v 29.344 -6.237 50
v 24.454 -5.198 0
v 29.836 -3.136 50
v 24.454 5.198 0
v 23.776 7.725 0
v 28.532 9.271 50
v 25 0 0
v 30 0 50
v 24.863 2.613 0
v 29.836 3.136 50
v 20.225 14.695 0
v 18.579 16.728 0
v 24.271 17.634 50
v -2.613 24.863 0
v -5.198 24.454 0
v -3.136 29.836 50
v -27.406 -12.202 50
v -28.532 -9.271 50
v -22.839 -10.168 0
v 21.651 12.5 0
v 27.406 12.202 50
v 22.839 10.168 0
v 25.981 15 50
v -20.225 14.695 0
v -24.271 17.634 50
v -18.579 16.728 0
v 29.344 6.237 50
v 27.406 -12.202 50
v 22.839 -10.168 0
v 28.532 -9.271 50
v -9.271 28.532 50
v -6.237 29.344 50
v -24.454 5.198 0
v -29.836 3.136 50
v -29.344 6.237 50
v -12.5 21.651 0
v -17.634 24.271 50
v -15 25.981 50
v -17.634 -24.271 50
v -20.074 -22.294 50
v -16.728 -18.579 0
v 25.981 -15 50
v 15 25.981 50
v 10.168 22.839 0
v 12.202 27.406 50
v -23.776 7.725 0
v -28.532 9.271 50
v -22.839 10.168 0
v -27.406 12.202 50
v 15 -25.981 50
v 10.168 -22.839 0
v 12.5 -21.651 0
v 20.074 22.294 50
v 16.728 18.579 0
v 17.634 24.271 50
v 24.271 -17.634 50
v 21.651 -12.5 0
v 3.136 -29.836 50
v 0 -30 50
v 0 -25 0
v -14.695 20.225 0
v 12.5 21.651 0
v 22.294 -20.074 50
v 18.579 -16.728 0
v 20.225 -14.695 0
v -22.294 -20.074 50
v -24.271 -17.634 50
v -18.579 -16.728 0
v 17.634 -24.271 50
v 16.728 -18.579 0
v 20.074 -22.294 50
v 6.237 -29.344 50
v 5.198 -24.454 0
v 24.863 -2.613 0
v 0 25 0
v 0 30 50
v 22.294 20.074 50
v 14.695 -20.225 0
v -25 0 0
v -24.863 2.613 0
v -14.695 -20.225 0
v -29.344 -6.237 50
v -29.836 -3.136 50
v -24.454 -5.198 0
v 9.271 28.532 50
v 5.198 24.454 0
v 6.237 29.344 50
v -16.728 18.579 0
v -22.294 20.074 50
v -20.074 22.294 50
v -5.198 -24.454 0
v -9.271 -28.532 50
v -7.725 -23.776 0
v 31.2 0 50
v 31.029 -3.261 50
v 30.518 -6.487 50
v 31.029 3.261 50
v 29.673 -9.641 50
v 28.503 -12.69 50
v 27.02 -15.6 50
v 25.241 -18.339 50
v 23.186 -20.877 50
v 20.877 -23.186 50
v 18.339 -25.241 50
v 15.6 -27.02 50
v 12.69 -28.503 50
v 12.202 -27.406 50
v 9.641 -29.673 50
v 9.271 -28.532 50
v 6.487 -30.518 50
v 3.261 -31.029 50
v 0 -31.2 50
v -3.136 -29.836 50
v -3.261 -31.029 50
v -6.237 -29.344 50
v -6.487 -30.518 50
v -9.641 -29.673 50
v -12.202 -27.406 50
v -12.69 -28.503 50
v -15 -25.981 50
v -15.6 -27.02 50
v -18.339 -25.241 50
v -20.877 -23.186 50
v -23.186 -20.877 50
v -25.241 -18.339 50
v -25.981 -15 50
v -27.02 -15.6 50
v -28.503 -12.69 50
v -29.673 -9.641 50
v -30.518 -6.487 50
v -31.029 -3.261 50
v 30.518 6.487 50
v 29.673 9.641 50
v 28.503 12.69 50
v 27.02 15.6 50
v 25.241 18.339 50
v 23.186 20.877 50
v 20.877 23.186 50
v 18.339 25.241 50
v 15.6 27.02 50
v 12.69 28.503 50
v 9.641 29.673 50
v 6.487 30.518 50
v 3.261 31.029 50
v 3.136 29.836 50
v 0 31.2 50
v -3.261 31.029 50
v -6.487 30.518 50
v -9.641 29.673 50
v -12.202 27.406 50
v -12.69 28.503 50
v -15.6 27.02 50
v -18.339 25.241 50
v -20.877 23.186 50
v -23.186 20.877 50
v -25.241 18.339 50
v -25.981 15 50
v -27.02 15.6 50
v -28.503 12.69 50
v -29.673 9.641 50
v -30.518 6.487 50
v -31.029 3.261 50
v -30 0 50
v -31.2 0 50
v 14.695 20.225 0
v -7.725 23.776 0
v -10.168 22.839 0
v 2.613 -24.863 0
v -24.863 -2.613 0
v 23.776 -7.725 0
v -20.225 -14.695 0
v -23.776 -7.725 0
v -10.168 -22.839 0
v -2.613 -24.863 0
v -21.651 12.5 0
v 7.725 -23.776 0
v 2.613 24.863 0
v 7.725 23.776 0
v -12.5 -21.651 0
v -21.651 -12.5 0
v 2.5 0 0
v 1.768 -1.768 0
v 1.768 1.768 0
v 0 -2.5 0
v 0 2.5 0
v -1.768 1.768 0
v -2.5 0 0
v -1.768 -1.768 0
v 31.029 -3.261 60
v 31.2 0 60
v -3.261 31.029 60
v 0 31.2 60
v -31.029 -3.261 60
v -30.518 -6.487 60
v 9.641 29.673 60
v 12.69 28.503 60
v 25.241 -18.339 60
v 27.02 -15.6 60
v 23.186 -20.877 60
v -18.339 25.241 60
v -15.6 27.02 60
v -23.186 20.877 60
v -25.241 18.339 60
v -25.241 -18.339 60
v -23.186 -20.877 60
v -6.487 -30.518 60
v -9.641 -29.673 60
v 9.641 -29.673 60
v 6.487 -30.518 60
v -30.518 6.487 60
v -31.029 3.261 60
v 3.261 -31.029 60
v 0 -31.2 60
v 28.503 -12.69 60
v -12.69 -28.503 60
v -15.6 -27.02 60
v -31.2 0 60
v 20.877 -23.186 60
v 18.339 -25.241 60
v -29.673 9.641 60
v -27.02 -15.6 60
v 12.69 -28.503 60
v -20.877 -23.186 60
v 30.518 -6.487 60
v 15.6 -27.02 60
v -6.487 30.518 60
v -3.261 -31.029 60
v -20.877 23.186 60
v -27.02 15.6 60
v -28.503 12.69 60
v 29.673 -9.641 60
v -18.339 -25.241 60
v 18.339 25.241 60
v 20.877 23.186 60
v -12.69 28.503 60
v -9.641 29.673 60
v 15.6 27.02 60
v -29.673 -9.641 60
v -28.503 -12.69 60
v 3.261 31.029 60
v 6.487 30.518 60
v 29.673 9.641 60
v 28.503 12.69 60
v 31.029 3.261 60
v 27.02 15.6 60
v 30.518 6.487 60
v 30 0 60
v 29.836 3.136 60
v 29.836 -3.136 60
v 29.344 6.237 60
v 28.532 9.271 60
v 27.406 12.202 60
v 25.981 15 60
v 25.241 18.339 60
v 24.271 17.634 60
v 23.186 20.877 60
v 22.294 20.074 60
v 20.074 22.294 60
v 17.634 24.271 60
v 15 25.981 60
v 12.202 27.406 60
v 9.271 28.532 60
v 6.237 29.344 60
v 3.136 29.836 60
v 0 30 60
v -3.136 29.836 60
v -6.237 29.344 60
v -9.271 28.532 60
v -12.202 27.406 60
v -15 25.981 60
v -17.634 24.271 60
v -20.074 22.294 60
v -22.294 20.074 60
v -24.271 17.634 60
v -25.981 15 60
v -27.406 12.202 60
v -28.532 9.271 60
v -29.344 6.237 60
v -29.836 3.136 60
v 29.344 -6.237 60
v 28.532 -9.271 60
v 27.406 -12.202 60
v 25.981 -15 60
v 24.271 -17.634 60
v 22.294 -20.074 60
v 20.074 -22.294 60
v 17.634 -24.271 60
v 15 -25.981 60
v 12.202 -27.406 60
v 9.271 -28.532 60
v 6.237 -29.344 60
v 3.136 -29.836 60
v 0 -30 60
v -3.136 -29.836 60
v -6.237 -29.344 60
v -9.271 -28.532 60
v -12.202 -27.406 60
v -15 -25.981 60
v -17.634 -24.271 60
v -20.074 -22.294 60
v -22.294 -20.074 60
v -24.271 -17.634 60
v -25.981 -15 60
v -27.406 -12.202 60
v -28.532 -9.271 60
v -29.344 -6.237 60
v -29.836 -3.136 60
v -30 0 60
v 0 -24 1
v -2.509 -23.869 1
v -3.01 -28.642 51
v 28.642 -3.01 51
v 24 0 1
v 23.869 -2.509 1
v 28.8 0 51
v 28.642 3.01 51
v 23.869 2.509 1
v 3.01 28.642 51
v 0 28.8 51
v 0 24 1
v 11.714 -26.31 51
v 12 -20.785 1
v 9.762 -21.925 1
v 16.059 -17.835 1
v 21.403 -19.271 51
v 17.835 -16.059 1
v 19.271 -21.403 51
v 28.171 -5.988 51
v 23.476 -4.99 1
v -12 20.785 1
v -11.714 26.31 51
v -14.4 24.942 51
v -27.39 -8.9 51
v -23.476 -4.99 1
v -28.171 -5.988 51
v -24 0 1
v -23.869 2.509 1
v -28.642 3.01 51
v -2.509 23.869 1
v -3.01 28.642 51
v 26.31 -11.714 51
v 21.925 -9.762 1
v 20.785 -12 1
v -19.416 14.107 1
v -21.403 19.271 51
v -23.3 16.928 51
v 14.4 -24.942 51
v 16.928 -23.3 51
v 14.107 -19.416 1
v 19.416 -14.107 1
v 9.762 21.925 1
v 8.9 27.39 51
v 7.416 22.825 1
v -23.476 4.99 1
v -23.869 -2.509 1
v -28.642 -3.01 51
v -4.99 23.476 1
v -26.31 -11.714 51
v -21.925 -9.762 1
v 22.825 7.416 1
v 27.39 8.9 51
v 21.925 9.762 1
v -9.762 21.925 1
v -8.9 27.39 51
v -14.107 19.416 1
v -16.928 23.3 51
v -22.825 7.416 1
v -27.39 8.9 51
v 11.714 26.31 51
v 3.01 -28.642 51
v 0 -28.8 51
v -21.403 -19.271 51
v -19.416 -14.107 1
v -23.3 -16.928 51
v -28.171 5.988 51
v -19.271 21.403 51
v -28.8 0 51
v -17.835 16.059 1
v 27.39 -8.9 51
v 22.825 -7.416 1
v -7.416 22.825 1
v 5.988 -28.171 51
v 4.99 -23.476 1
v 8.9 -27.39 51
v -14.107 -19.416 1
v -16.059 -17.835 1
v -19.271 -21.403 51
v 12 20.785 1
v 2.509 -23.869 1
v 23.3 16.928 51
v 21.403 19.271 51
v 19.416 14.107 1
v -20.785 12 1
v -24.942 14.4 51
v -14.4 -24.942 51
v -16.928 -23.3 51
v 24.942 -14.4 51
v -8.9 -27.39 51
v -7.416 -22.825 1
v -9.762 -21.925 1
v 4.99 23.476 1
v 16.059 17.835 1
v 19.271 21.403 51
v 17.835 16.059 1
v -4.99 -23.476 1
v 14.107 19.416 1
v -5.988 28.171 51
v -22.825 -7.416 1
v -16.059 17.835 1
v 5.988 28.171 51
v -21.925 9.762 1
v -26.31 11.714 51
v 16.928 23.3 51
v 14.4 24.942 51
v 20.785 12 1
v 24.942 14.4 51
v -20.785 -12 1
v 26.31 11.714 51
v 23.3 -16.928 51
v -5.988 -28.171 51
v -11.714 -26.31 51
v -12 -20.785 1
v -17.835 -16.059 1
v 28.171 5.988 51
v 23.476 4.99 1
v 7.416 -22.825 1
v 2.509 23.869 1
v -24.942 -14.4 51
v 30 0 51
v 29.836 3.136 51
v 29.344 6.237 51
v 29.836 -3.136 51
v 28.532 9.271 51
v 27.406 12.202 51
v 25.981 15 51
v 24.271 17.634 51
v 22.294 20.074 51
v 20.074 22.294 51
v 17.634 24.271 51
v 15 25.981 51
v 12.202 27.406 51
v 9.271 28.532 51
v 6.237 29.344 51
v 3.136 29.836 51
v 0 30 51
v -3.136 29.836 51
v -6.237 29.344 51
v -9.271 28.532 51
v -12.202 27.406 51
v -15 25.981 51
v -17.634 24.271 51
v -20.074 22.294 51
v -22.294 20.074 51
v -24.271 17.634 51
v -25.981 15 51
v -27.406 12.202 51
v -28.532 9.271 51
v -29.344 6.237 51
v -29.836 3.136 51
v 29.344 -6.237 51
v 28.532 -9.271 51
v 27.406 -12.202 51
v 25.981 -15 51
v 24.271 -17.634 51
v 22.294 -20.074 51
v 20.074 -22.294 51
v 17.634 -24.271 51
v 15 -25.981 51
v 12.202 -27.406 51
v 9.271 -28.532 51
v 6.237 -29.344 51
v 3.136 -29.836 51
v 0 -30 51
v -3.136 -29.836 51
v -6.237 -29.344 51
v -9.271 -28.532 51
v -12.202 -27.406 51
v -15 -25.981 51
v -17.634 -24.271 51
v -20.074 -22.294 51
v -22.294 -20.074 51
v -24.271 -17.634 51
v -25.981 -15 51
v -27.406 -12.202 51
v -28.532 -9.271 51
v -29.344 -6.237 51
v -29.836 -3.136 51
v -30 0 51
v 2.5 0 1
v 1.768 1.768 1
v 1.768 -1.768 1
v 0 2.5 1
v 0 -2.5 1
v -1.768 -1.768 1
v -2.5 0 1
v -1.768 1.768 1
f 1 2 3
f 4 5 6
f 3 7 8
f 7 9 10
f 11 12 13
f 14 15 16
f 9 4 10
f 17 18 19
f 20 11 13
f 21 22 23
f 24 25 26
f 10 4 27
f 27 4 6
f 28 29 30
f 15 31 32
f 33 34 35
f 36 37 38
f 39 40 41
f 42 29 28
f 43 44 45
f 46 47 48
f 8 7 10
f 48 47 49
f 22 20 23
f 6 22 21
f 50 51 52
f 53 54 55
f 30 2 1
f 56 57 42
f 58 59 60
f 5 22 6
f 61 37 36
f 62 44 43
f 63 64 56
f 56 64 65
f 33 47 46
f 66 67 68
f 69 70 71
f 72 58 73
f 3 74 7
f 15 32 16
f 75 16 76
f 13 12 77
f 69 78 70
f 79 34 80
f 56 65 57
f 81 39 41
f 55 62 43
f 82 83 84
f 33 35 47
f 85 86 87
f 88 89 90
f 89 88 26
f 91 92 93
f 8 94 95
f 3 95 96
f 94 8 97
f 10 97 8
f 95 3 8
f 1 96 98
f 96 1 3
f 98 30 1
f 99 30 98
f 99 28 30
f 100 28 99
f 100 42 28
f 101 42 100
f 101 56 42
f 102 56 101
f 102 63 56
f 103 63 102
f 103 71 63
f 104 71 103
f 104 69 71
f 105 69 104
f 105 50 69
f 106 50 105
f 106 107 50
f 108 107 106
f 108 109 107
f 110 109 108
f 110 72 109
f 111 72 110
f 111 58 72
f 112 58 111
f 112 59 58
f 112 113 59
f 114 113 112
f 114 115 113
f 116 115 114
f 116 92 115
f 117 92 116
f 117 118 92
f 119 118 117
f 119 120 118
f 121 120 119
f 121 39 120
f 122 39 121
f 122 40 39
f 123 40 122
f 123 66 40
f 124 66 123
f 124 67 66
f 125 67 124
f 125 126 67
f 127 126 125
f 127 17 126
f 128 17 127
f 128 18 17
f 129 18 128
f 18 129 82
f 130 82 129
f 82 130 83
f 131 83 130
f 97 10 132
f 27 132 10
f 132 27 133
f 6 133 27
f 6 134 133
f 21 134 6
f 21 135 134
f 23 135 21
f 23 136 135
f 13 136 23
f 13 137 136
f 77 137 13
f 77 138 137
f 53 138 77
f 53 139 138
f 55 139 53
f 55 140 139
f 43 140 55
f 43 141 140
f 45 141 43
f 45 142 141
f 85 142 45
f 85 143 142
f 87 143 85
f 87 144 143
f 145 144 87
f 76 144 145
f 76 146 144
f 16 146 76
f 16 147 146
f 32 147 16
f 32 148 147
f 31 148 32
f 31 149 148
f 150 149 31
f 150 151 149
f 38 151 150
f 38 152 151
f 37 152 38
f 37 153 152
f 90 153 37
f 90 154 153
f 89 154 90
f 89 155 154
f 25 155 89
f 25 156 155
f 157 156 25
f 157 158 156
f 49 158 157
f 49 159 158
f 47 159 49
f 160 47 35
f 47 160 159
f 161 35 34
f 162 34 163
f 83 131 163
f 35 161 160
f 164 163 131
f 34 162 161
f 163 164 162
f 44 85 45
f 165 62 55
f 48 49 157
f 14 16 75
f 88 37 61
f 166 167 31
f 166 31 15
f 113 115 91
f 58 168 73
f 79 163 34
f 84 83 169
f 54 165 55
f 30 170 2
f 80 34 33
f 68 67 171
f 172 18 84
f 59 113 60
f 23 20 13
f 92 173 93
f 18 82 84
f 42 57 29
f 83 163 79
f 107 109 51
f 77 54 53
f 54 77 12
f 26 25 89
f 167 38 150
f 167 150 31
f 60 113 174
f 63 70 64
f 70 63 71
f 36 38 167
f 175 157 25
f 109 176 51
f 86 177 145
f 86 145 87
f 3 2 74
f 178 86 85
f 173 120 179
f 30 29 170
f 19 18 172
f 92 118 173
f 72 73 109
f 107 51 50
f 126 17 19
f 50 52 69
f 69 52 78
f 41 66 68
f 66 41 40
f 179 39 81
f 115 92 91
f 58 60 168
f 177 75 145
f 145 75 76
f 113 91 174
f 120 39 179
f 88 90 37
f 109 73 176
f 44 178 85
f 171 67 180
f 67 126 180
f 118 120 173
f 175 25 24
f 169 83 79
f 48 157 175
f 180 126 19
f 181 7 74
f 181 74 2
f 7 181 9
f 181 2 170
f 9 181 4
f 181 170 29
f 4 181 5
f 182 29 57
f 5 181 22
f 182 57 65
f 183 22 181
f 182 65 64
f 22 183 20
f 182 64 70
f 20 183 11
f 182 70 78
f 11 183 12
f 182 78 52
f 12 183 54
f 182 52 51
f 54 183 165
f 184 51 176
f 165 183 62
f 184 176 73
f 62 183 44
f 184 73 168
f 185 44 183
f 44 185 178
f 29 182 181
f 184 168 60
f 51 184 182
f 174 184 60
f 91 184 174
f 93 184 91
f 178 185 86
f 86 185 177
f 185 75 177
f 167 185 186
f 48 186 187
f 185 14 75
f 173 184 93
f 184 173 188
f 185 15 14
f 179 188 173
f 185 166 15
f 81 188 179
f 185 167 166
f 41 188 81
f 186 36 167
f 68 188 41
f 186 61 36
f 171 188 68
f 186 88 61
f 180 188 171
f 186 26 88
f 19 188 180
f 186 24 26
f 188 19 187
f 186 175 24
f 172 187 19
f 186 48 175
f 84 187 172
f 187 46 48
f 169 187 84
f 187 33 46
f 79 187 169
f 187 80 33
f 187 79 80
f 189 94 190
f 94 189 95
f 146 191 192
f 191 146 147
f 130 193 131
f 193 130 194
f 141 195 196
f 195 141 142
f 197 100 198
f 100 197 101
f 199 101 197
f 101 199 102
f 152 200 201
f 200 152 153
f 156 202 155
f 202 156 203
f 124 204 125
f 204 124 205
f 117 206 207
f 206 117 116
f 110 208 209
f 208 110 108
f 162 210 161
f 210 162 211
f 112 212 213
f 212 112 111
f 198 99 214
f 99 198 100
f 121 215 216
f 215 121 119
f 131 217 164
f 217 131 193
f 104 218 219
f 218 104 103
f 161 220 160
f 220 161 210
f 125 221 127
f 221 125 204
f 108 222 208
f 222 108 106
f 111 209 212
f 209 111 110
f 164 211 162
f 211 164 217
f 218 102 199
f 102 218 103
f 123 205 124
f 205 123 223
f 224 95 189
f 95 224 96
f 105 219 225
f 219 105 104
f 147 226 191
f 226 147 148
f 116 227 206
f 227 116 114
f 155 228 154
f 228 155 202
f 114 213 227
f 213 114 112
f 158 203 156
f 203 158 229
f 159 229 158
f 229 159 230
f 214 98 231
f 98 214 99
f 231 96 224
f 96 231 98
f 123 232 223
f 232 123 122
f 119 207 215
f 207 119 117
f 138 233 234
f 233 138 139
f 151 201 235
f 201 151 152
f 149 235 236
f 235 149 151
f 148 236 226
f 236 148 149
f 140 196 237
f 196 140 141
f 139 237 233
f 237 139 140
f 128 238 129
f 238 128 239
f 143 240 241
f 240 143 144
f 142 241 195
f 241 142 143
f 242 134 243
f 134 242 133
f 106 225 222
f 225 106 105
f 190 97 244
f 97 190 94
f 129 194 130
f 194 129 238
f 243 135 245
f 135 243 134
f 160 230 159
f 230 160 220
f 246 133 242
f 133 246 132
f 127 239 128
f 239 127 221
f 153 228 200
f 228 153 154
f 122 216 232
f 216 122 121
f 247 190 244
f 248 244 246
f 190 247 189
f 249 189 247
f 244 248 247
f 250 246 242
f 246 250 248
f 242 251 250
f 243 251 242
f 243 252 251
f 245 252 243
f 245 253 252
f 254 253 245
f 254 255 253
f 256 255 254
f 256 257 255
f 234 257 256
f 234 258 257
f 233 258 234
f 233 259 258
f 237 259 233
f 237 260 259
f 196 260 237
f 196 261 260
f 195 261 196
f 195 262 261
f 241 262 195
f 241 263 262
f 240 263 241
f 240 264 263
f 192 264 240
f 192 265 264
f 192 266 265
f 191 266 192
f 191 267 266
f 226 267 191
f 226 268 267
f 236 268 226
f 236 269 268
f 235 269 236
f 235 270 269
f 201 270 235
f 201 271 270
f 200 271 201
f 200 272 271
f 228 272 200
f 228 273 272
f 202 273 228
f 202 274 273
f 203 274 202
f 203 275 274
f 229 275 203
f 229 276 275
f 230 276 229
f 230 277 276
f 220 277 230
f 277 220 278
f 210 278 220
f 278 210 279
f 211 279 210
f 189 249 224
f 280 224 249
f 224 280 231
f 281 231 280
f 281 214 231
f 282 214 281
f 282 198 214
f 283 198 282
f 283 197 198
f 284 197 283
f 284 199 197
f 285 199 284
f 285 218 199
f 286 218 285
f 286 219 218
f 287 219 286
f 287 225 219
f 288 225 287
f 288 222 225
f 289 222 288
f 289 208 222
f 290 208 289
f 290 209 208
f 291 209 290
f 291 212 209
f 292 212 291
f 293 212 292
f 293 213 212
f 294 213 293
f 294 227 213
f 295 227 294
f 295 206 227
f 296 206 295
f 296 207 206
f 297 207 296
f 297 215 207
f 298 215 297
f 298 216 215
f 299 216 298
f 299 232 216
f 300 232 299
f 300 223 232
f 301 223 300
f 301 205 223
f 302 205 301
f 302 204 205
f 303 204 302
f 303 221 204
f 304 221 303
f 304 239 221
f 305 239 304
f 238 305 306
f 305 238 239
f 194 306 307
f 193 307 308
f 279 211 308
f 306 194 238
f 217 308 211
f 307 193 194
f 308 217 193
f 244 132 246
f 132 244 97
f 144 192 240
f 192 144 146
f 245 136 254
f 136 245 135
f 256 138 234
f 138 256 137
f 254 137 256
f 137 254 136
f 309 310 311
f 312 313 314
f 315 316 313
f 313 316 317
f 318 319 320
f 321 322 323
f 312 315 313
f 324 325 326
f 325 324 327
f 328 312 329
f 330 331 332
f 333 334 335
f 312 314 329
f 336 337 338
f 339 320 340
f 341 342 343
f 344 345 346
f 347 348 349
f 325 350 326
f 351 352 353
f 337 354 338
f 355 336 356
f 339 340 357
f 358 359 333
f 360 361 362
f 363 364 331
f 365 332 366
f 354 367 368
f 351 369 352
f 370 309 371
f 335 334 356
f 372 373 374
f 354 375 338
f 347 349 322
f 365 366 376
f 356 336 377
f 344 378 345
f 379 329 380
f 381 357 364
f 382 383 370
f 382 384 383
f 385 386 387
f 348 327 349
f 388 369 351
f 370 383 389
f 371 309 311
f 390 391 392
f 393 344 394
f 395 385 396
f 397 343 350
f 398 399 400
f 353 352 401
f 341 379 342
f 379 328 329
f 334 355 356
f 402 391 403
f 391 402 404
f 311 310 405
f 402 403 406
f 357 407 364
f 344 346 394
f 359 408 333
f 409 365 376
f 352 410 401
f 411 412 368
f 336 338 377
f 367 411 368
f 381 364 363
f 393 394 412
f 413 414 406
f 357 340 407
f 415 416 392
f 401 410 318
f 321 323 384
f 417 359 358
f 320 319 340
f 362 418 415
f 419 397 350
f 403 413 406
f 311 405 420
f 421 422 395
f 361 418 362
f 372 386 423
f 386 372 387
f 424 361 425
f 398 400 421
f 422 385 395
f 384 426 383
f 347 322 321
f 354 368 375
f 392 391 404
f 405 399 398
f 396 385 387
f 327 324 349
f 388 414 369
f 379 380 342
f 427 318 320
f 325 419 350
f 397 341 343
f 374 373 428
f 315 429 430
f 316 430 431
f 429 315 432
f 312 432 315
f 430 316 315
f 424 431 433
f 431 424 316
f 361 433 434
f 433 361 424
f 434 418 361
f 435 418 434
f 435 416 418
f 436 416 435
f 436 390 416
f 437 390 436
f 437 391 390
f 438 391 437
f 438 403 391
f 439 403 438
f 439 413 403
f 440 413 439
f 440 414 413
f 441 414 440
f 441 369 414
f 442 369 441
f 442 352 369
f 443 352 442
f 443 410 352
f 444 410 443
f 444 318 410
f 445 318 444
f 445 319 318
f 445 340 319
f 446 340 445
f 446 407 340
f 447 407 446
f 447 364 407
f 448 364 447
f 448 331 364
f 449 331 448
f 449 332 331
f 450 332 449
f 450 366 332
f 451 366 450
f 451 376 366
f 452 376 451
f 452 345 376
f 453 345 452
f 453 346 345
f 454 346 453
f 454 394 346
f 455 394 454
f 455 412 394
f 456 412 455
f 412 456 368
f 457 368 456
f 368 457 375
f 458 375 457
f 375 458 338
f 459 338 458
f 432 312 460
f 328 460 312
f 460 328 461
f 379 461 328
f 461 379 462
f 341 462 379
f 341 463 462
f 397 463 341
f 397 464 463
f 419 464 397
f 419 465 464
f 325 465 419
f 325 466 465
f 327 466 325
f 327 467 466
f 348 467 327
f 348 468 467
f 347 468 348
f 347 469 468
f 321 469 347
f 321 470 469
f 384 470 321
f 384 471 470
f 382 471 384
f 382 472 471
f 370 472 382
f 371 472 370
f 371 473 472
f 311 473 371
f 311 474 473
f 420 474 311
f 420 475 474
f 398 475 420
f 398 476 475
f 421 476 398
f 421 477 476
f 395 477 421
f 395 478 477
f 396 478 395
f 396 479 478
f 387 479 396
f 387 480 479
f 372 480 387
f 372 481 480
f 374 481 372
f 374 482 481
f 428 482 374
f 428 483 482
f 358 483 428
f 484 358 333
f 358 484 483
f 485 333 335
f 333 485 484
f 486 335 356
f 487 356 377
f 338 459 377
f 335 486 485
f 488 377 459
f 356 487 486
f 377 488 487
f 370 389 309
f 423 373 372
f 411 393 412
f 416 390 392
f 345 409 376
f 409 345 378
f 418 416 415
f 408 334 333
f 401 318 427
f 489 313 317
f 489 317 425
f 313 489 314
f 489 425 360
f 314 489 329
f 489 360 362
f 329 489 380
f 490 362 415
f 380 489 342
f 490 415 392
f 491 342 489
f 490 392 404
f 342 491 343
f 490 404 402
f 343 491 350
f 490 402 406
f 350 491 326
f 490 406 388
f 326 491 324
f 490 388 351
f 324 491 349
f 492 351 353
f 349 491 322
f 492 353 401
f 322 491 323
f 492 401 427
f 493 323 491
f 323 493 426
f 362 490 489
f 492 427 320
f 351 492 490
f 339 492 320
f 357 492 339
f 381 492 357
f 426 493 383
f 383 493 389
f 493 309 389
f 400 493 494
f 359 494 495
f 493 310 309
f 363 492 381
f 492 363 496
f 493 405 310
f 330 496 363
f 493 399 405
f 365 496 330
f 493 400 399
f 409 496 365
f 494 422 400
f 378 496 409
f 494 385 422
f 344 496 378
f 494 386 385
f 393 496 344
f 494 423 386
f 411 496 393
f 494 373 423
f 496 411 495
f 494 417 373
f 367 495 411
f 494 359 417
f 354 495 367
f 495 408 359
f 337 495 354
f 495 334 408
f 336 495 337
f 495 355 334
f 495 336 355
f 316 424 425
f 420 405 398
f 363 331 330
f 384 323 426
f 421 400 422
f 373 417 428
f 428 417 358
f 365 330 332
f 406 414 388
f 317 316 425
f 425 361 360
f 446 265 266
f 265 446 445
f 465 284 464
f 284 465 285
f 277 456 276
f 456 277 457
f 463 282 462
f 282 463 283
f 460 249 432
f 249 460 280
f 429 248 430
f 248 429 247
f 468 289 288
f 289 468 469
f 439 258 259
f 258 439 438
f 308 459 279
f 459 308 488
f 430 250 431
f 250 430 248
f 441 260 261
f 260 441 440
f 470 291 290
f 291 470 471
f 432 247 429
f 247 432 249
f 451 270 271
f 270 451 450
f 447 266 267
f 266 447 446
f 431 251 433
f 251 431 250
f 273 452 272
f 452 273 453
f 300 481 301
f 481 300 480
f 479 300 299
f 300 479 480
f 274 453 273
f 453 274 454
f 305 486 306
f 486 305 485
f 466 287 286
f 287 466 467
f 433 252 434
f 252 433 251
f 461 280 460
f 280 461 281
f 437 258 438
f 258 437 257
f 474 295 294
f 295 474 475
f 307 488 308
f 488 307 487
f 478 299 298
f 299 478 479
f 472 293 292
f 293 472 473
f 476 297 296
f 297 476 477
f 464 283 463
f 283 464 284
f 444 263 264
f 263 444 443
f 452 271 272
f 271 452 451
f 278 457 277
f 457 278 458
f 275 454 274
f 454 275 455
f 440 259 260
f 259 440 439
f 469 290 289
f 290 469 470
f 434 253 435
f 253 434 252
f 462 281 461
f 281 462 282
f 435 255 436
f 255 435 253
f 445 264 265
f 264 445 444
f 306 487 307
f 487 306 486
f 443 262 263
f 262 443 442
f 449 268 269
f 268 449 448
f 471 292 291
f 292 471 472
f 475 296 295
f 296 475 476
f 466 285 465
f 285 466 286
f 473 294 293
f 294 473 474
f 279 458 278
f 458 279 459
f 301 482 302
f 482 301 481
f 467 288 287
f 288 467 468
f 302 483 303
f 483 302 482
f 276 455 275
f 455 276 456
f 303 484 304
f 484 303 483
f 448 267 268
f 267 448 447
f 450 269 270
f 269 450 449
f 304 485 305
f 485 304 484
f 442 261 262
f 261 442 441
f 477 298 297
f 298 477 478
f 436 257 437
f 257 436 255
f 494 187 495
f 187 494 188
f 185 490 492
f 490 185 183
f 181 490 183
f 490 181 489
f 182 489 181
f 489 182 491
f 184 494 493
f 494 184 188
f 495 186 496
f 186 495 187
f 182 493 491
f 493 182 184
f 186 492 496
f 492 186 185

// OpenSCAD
// Do you want to have a drain hole? In case of a saucer set to Yes if you have a drainhole in the pot
Drain_hole = "Yes"; //[Yes,No]
// Do you want to have risers (only for saucers, see desciption)
Pot_risers = "No"; //[Yes,No]
/*[Bottom Part settings]*/
// Defines the thickness of the bottom part of your Pot
Bottom_Thickness = 1;
// Wall Thickness of the bottom part in mm
Wall_thickness = 1;
// Diameter of the bottom part in mm
Lower_Diameter = 50;
// Defines the angle of the walls in the X Direction(1 = 90degees)
Scale_X_Direction = 1.2;
// Defines the angle of the walls in the X Direction(1 = 90degrees)
Scale_Y_Direction = 1.2;
// Hight of the Bottom Part / Base
base_height = 50;
// When the pot shouldbe twisted insert here an angle between 20 and 40 or 0
Twist_angle = 0;
// sides of the bottom Part, the more sides, the rounder it is
Sides_of_the_base = 60; //[3:100]
// diameter of the Drainhole in mm
Drain_Hole_Diameter = 5;
/*[Hidden]*/
/*[Rim settings]*/
// hightof your rim in mm
Rim_hight = 10;
// Defines the distance therim shouldpoint out in mm (0=no rim)
Rim_thickness = 1;
// defines the Angle of the twist in the rim in degrees
twist_angle_rim = 0;
/*[Hidden]*/
/*[Pot riser Settings]*/
// Number of risers (default = 5)
Number_of_pot_risers = 5;
// hight of the risers in mm
riser_hight = 1;
/*[Hidden]*/
union(){
  difference() {
    difference() {
      union(){
        linear_extrude( height=base_height, twist=Twist_angle, scale=[Scale_X_Direction, Scale_Y_Direction], center=false){
          {
            $fn=Sides_of_the_base;    //set sides to Sides_of_the_base
            circle(r=(Lower_Diameter / 2));
          }
        }
        translate([0, 0, base_height]){
          linear_extrude( height=Rim_hight, twist=twist_angle_rim, scale=[1, 1], center=false){
            scale([Scale_X_Direction, Scale_Y_Direction, 1]){
              if (Twist_angle == 0) {
                {
                  $fn=Sides_of_the_base;    //set sides to Sides_of_the_base
                  circle(r=(Lower_Diameter / 2 + Rim_thickness));
                }
              } else {
                rotate([0, 0, ((360 / Sides_of_the_base) / (((2/30)*Twist_angle)*1.1))]){
                  {
                    $fn=Sides_of_the_base;    //set sides to Sides_of_the_base
                    circle(r=(Lower_Diameter / 2 + Rim_thickness));
                  }
                }
              }

            }
          }
        }
      }

      translate([0, 0, Bottom_Thickness]){
        union(){
          linear_extrude( height=base_height, twist=Twist_angle, scale=[Scale_X_Direction, Scale_Y_Direction], center=false){
            {
              $fn=Sides_of_the_base;    //set sides to Sides_of_the_base
              circle(r=(Lower_Diameter / 2 - Wall_thickness));
            }
          }
          translate([0, 0, base_height]){
            linear_extrude( height=Rim_hight, twist=twist_angle_rim, scale=[1, 1], center=false){
              scale([Scale_X_Direction, Scale_Y_Direction, 1]){
                if (Twist_angle == 0) {
                  {
                    $fn=Sides_of_the_base;    //set sides to Sides_of_the_base
                    circle(r=(Lower_Diameter / 2 + 0));
                  }
                } else {
                  rotate([0, 0, ((360 / Sides_of_the_base) / (((2/30)*Twist_angle)*1.1))]){
                    {
                      $fn=Sides_of_the_base;    //set sides to Sides_of_the_base
                      circle(r=(Lower_Diameter / 2 + 0));
                    }
                  }
                }

              }
            }
          }
        }
      }
    }

    if (Drain_hole == "Yes" && Pot_risers == "No") {
      cylinder(r1=(Drain_Hole_Diameter / 2), r2=(Drain_Hole_Diameter / 2), h=1000, center=true);
    }

  }
  if (Pot_risers == "Yes") {
    difference() {
      for (i = [0 : abs(1) : Number_of_pot_risers]) {
        rotate([0, 0, ((360 / Number_of_pot_risers) * i)]){
          translate([0, -1.5, Bottom_Thickness]){
            cube([((Lower_Diameter - 10) / 2), 3, riser_hight], center=false);
          }
        }
      }

      if (Drain_hole == "Yes") {
          translate([0,0,(Bottom_Thickness*(1))]){
        cylinder(r1=(Drain_Hole_Diameter / 2), r2=(Drain_Hole_Diameter / 2), h=1000, center=false);
      }}

    }
  }

}
